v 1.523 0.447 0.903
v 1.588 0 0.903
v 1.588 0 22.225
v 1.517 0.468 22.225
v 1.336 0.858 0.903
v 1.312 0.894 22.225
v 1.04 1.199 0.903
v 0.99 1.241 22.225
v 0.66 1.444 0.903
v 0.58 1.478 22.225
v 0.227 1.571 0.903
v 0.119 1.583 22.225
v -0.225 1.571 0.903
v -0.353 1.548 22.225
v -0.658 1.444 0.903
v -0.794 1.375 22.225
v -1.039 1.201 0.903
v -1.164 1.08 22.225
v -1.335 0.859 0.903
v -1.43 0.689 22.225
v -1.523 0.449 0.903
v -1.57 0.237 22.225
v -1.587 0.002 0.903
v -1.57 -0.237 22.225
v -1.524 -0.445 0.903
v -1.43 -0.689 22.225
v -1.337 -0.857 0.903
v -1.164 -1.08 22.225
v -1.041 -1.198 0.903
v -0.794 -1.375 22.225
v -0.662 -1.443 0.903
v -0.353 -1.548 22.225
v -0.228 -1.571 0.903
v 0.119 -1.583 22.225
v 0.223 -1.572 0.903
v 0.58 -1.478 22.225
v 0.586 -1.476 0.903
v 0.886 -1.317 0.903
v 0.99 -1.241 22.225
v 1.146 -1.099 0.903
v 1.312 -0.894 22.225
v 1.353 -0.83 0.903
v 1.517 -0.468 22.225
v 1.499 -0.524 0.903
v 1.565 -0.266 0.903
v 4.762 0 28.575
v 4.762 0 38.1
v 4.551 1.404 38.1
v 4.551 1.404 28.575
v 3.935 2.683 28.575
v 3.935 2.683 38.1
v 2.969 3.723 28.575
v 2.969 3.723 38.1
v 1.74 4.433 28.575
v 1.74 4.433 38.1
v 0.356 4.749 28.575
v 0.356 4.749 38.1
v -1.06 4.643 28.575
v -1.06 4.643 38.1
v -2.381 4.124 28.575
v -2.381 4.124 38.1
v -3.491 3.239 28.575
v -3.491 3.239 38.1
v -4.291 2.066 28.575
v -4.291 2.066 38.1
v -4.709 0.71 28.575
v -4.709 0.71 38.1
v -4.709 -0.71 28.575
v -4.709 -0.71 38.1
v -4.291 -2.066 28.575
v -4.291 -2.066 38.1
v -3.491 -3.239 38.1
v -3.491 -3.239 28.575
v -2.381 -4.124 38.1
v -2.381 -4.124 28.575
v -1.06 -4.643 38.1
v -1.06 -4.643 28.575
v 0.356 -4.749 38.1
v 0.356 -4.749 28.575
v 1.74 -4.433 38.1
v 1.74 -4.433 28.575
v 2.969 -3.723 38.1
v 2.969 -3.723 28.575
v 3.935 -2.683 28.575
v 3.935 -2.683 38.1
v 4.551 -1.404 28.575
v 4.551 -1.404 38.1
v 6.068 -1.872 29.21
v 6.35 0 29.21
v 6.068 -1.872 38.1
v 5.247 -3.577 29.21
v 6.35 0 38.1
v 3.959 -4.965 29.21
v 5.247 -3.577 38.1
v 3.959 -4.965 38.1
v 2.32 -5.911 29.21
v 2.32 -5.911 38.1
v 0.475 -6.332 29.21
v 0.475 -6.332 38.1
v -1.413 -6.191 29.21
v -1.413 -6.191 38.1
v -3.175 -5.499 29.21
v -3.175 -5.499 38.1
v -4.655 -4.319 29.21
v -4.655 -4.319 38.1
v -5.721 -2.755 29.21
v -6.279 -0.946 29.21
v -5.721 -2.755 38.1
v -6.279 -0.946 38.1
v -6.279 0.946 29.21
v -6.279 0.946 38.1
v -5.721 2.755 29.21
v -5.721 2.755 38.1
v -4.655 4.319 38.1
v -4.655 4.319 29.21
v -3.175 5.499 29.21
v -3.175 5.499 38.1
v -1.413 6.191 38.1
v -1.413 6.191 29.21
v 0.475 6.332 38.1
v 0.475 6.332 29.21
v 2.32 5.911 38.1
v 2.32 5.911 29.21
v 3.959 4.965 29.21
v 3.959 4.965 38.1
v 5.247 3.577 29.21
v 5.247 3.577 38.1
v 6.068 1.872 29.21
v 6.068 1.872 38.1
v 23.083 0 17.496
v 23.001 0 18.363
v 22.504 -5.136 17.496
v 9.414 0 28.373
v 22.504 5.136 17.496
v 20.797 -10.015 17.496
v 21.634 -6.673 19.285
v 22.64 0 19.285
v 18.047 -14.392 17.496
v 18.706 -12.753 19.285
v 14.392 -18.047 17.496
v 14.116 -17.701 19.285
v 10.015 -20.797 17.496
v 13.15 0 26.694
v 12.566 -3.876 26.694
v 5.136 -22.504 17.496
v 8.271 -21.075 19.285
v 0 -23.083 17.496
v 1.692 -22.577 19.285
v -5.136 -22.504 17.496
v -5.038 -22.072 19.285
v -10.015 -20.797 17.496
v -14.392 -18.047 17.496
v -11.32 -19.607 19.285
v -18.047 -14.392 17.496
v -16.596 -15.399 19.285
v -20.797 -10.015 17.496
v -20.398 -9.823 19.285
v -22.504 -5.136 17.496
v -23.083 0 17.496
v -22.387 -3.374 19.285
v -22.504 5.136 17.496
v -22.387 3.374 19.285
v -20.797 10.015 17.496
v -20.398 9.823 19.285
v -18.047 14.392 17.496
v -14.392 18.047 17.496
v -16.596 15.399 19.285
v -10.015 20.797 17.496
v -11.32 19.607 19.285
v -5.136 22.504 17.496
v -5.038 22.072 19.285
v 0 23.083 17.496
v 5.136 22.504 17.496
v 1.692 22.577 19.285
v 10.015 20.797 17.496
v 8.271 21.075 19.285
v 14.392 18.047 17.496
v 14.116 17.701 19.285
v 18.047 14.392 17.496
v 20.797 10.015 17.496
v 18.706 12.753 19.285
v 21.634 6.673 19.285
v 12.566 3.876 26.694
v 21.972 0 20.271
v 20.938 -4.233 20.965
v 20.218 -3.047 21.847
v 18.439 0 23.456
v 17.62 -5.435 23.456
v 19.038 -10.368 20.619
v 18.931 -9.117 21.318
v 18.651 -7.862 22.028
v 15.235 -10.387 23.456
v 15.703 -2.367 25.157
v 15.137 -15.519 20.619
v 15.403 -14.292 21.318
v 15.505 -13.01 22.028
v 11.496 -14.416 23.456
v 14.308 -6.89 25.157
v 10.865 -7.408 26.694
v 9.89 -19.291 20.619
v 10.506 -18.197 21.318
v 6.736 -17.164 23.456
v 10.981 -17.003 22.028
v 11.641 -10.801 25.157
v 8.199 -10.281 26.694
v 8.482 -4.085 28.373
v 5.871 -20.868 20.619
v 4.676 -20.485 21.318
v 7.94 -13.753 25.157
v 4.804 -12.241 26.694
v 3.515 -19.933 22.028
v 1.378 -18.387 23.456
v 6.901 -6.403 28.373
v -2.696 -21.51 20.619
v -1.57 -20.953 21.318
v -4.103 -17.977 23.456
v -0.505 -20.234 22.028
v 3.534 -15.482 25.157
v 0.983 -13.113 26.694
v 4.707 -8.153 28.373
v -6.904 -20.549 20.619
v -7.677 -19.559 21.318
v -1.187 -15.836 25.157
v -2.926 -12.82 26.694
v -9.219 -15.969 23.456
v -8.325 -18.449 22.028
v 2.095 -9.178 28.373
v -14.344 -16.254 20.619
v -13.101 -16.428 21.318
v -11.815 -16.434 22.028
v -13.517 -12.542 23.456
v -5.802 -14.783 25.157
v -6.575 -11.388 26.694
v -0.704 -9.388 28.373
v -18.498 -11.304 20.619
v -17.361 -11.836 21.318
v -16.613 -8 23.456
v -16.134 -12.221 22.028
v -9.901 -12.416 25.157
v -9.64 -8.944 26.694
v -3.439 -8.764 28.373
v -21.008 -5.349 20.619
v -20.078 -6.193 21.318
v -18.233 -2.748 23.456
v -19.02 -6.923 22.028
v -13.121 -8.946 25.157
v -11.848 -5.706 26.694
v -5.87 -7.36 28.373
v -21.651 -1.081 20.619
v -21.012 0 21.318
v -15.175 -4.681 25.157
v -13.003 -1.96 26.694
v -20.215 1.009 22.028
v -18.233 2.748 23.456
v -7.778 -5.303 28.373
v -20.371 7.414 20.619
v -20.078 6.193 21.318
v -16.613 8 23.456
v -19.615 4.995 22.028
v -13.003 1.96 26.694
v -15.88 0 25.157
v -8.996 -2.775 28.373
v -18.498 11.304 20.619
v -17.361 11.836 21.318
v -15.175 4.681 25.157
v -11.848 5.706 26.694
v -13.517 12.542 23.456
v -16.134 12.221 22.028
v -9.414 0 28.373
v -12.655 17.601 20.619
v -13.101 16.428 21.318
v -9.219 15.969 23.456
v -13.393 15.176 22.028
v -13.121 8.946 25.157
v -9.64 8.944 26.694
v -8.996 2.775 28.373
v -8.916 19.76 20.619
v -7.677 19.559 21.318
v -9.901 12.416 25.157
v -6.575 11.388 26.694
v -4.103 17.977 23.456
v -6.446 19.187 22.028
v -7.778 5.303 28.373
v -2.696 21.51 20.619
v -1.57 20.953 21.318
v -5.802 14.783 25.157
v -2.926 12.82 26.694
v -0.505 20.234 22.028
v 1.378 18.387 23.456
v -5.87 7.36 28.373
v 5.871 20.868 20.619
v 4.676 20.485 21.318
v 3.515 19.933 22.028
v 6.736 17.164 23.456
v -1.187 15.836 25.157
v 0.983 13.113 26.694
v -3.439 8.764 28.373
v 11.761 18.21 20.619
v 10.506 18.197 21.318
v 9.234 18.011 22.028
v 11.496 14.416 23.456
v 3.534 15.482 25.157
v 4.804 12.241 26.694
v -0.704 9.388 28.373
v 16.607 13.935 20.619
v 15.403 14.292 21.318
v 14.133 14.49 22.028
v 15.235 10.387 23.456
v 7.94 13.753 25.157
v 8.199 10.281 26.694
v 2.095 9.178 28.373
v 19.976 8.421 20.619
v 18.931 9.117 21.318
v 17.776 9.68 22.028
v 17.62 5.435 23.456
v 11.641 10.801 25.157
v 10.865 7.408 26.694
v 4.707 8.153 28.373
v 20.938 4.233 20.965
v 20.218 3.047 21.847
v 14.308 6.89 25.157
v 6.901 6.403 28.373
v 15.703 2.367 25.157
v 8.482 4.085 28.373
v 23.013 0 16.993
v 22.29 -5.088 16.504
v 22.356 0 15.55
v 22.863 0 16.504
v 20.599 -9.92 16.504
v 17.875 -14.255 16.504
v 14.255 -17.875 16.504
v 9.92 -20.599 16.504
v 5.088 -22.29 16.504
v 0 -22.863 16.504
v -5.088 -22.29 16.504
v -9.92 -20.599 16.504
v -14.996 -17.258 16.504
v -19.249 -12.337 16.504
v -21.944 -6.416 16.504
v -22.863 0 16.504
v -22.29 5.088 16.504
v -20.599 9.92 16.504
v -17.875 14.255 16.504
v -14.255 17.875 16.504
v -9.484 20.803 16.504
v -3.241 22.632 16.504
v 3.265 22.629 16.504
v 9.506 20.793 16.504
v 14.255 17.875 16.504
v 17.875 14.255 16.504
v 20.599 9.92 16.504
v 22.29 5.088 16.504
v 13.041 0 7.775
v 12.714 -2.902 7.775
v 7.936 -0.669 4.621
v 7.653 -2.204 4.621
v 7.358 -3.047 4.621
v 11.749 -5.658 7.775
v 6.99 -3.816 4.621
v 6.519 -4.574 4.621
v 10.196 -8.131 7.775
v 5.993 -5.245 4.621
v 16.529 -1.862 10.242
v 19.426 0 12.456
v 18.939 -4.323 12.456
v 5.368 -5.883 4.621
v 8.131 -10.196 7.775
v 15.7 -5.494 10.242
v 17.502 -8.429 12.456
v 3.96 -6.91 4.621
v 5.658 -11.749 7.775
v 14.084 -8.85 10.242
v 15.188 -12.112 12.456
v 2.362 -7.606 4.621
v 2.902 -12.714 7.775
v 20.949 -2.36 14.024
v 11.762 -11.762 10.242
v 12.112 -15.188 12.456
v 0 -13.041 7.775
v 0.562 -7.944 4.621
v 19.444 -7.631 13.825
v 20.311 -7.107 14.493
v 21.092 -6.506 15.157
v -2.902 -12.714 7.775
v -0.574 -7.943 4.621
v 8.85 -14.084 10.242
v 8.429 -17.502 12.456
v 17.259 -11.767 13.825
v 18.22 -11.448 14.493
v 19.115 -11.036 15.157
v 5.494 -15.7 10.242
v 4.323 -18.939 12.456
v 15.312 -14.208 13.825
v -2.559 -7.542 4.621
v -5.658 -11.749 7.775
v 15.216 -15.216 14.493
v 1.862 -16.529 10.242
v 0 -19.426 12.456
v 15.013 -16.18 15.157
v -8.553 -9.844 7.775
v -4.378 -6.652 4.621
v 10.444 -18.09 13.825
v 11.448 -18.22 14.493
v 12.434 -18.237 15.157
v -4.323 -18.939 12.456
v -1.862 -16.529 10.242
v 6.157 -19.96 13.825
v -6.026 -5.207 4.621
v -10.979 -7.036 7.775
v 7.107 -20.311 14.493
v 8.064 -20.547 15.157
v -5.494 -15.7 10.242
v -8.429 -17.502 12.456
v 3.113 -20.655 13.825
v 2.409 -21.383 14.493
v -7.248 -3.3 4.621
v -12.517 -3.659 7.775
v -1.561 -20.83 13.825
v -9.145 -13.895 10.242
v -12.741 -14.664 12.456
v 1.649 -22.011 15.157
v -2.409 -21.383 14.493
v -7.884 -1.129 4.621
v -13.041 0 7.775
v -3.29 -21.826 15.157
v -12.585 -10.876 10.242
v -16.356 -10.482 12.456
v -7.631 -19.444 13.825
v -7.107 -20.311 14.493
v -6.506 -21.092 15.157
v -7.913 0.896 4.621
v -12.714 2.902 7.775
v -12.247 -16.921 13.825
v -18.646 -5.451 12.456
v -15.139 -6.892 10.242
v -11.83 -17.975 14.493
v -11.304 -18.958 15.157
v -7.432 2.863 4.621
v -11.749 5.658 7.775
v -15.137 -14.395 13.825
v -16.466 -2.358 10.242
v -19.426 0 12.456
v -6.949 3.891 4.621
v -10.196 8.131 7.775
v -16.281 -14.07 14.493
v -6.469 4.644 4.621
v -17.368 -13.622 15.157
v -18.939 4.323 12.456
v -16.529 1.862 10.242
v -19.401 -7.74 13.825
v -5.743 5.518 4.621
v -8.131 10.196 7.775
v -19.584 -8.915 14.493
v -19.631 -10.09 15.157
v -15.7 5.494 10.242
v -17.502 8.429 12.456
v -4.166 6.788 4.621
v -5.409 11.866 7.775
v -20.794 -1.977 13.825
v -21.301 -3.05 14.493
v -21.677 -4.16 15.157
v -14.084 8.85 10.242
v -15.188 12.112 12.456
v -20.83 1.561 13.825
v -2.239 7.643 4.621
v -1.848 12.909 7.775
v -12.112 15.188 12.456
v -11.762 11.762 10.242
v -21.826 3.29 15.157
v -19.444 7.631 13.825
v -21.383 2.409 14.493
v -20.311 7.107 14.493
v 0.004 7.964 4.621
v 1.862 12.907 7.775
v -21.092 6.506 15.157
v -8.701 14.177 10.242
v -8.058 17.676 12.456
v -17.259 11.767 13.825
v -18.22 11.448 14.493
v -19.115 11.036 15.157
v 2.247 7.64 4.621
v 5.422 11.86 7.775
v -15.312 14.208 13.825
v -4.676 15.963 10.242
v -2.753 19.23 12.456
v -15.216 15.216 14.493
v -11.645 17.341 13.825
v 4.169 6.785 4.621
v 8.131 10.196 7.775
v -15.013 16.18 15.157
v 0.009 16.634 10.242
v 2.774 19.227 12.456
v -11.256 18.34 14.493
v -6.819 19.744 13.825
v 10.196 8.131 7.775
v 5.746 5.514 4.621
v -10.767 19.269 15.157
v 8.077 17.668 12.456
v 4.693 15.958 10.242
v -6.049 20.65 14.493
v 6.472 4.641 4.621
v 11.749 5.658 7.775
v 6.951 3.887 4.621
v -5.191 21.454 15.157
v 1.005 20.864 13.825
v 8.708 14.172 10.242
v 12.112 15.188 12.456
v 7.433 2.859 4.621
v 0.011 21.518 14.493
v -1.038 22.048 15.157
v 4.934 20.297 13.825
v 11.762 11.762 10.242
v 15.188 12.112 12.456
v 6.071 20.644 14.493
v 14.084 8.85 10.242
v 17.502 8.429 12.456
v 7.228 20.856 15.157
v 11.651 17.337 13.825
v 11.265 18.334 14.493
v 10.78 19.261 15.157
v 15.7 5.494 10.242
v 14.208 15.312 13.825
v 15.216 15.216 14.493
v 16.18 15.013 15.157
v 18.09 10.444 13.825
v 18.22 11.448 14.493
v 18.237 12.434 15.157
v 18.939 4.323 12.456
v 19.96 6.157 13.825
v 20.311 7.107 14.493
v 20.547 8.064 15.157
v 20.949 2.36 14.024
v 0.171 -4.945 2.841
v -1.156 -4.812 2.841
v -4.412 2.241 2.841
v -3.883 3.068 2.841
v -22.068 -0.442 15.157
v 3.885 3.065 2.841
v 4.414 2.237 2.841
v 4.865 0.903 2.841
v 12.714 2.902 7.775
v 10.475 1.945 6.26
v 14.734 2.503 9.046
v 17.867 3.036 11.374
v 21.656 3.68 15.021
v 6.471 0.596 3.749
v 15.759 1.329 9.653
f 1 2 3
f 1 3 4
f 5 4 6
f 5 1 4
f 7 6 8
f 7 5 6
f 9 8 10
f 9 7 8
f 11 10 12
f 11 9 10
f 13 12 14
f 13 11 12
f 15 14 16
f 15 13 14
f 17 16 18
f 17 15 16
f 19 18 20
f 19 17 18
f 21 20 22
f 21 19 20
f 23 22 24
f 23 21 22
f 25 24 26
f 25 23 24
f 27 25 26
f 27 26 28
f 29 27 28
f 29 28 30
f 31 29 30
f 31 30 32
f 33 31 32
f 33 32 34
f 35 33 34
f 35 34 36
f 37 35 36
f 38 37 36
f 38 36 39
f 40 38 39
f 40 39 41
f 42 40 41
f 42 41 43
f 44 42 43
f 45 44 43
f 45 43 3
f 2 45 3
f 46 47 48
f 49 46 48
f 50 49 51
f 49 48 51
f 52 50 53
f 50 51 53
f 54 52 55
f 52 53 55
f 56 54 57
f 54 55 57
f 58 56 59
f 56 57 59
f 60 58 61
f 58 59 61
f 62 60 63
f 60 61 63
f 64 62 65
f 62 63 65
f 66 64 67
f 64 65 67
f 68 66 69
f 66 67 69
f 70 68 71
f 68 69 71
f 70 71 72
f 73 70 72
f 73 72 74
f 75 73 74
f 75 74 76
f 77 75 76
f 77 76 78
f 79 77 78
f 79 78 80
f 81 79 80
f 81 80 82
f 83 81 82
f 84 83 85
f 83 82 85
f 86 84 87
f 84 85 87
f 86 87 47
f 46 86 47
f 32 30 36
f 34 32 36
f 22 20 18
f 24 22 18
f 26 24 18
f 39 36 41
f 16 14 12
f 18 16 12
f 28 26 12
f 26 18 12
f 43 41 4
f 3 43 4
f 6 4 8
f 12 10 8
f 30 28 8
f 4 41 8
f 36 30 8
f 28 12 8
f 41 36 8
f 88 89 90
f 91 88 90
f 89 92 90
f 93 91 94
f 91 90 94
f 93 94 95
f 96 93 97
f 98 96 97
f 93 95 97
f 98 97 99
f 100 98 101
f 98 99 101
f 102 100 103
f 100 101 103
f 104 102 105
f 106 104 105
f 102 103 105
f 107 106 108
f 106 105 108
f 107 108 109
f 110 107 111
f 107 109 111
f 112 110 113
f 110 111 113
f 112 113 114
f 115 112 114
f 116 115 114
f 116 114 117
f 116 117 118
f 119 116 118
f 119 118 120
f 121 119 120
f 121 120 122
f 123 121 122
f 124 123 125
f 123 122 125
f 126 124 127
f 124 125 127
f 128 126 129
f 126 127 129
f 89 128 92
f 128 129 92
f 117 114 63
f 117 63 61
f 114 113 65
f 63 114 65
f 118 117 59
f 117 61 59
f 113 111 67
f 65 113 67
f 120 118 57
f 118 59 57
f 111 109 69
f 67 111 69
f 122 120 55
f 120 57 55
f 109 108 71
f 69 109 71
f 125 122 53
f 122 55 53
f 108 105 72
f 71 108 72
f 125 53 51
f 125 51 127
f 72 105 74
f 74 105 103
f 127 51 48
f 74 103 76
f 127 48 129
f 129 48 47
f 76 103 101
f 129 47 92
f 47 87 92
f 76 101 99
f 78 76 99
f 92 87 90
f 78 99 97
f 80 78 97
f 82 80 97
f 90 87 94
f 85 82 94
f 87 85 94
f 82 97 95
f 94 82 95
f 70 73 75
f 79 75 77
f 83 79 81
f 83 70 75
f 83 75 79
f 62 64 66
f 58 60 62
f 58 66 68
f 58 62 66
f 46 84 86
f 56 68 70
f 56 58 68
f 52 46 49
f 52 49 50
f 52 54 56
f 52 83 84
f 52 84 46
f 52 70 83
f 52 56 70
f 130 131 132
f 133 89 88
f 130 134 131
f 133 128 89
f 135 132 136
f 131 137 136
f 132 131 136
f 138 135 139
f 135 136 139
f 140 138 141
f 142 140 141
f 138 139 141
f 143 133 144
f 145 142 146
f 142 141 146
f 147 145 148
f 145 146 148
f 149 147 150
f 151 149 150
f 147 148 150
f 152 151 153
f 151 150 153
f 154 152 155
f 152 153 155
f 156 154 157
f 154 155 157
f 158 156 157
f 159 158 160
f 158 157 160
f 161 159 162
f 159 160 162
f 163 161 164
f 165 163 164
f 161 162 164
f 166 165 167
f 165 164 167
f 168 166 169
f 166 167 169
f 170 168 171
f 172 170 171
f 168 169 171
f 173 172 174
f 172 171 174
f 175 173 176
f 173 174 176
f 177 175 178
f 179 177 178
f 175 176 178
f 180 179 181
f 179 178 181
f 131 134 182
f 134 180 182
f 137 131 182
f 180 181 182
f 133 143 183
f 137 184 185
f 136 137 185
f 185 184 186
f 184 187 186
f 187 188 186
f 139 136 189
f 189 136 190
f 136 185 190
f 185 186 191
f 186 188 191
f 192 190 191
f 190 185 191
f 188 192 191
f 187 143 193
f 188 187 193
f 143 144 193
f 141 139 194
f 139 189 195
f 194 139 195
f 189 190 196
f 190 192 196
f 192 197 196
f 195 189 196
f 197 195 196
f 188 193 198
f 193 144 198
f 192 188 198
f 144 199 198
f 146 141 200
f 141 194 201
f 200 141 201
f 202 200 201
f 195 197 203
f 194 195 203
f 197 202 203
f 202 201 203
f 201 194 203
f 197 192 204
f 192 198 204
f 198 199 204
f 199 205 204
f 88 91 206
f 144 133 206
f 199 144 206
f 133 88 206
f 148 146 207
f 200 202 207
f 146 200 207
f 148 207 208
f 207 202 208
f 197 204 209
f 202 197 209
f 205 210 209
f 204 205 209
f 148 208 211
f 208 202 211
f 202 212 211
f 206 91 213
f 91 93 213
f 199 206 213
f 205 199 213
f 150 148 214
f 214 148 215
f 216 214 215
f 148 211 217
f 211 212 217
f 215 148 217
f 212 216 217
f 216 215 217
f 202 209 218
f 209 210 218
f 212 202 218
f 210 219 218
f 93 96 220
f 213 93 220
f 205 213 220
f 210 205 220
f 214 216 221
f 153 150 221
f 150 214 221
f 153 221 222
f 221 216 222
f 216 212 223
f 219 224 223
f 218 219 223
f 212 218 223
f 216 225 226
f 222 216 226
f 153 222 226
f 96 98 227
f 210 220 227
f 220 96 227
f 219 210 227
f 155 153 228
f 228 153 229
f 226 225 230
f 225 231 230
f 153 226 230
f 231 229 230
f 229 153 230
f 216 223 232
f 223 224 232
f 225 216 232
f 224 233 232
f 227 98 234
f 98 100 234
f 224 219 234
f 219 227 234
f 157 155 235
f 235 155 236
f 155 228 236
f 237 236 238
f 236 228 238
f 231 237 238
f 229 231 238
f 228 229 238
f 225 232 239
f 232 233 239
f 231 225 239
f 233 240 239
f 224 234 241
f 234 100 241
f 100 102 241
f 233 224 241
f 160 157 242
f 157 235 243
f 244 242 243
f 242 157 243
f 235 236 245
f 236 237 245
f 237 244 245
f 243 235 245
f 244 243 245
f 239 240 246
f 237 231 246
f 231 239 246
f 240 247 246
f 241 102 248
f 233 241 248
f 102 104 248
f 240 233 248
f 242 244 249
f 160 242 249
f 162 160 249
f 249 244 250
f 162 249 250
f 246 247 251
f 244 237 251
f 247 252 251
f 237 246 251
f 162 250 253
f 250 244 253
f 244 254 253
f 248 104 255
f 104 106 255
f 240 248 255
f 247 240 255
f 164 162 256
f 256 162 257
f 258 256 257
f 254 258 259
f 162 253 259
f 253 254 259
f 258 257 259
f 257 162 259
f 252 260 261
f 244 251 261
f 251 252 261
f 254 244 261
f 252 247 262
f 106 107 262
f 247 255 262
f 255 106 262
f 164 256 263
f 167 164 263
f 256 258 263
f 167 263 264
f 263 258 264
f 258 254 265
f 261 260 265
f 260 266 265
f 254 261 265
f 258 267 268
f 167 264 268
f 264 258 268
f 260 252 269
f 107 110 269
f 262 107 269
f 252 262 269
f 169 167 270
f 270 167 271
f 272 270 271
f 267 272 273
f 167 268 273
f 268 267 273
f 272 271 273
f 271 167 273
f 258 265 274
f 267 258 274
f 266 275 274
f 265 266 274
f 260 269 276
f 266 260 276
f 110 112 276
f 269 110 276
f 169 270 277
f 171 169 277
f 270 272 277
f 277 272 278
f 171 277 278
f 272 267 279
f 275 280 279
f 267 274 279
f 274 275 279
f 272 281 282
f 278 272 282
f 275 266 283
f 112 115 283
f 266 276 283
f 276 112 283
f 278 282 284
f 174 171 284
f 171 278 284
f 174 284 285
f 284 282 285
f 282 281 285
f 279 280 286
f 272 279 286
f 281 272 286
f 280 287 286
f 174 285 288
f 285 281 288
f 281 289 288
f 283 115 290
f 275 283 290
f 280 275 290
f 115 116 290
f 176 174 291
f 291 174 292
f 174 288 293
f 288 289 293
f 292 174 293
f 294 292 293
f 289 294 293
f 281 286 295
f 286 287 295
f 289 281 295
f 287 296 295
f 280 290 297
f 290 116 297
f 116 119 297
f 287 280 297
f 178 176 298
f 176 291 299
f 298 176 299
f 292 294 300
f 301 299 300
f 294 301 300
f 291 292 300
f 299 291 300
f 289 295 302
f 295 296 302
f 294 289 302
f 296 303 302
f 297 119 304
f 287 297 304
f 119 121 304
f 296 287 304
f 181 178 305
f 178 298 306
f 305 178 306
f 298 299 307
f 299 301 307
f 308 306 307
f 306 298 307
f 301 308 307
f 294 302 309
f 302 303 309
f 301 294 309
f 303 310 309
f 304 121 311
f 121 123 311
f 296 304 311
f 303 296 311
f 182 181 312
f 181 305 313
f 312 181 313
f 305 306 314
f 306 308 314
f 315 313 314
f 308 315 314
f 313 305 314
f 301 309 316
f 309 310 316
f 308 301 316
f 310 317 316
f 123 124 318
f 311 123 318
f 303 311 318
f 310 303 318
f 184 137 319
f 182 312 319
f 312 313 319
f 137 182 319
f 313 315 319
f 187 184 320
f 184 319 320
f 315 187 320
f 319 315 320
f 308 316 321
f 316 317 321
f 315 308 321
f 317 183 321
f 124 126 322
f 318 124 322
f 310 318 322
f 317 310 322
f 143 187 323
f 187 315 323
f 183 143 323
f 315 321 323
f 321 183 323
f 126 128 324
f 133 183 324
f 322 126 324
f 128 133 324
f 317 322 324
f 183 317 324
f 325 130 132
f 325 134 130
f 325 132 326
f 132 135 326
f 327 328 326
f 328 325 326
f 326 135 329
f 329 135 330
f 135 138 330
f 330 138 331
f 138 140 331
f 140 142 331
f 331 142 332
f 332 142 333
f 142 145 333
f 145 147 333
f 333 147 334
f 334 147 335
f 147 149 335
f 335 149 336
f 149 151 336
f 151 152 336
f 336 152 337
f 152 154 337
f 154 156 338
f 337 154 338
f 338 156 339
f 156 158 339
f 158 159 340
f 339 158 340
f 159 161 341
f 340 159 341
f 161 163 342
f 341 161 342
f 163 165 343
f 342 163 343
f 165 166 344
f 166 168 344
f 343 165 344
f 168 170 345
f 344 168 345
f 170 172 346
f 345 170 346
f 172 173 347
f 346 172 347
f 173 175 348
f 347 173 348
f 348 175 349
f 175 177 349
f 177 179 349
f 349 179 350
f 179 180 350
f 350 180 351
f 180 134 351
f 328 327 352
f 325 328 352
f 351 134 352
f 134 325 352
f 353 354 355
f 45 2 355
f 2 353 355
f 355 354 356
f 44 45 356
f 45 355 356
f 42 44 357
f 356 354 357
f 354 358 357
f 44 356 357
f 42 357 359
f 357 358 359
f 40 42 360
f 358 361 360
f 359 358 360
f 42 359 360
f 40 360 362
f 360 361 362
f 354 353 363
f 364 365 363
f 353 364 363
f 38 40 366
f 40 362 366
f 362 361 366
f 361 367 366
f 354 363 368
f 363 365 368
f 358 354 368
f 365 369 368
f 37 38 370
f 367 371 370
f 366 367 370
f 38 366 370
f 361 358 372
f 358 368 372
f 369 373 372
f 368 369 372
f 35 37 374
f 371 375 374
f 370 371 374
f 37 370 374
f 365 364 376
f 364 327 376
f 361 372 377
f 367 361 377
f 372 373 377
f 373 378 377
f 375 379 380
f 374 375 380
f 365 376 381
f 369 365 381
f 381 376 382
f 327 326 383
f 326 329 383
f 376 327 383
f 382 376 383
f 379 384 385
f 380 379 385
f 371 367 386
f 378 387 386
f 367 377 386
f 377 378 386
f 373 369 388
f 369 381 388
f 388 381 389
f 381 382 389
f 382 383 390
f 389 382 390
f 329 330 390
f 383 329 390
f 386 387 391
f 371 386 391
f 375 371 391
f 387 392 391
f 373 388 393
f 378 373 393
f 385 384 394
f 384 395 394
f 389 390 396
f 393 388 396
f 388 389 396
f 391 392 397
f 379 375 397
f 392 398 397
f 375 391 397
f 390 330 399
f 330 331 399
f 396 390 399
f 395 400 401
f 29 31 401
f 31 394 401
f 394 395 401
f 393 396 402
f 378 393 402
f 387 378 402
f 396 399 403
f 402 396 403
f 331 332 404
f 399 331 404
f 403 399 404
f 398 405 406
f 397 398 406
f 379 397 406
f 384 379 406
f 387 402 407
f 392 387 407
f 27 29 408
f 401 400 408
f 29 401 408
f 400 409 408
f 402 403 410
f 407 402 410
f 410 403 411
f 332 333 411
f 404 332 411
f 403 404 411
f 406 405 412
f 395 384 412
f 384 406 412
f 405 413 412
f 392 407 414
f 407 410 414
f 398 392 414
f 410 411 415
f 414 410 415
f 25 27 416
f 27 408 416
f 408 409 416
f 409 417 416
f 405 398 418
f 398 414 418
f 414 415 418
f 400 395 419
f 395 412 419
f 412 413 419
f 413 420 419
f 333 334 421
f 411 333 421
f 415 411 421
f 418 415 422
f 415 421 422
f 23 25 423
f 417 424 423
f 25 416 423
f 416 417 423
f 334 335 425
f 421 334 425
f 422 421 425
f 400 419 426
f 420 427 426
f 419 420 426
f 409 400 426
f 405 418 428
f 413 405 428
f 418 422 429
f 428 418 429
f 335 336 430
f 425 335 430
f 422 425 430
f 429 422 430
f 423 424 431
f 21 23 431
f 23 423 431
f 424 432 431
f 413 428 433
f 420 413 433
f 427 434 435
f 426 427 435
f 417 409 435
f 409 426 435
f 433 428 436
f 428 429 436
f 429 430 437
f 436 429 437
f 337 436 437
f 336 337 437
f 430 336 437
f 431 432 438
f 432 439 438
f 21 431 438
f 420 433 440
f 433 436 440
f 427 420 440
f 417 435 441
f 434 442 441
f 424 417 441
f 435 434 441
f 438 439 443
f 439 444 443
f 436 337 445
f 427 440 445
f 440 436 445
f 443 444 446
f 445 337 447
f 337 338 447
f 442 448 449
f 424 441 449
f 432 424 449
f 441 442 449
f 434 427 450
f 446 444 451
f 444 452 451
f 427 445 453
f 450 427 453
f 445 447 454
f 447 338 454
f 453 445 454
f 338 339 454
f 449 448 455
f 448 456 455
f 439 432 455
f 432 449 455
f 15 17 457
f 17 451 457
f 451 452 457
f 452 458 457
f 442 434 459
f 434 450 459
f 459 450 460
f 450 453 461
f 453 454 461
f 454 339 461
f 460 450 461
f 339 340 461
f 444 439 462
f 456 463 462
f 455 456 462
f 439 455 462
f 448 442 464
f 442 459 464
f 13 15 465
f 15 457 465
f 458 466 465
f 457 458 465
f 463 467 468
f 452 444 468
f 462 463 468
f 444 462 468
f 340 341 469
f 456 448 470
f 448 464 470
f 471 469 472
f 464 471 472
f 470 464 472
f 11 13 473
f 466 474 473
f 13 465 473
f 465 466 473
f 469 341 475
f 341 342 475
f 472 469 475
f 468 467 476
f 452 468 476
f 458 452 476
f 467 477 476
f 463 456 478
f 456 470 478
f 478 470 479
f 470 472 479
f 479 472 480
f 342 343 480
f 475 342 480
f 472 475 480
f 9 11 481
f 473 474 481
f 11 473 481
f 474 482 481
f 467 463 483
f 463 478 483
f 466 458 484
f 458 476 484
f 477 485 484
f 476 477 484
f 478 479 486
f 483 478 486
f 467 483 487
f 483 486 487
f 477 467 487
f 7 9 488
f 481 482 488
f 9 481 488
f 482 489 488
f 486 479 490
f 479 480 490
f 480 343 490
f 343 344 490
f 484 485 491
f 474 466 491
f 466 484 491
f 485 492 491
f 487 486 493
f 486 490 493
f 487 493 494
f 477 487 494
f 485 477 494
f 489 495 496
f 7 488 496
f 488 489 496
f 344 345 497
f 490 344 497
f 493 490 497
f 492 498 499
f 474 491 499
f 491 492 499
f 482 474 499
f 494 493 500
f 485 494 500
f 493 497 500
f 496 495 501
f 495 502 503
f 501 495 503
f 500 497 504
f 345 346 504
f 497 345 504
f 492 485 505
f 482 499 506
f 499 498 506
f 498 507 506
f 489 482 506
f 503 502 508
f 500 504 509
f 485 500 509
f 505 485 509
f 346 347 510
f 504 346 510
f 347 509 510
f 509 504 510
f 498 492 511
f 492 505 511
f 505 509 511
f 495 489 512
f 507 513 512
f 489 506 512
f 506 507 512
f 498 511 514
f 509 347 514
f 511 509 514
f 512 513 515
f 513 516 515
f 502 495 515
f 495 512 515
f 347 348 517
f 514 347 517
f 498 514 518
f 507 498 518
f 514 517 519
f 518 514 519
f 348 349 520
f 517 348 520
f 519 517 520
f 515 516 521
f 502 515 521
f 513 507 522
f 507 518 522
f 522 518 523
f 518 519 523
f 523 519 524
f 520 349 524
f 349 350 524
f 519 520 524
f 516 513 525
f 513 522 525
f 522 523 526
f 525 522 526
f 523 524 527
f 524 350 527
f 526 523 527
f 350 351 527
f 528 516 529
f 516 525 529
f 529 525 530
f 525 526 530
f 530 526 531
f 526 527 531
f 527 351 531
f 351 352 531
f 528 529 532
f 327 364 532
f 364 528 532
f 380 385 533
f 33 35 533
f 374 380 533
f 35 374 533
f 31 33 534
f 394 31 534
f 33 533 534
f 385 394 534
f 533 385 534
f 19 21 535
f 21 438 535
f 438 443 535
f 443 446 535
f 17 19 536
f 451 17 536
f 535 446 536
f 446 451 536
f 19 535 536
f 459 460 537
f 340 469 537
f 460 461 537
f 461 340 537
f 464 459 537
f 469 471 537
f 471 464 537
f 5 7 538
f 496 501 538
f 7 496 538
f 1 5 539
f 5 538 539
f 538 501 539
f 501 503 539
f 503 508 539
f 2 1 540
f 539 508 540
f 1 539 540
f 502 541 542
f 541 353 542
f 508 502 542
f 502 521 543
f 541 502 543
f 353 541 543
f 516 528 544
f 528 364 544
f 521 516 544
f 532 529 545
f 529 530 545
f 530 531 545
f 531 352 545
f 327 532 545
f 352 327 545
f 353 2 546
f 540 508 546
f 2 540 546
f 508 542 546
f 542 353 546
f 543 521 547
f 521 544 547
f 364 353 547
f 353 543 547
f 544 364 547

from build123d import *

# Parameters (mm, degrees)
F2_R     = 4.7625
F3_DEPTH = 9.525
F4_R     = 1.5875
F5_DEPTH = 22.225


with BuildPart() as f1:
    # F0 (on Front) → F1 (revolve)
    with BuildSketch(Plane.XZ):
        with BuildLine():
            Line((0, 38.1), (0, 0))
            add(Edge.make_bspline(
                [(0, 0), (11.7584649328, 6.6668250328), (19.7077058908, 11.7946774257), (23.020163798, 16.3133065778), (23.0828764178, 17.4960782864)],
                knots=[0, 0, 0, 0, 0.4304974224, 0.5620722598, 0.5620722598, 0.5620722598, 0.5620722598], degree=3))
            add(Edge.make_bspline(
                [(23.0828764178, 17.4960782864), (23.114800057, 18.0981640784), (22.1160167846, 22.2466526855), (10.6358158862, 28.6732271947), (6.35, 29.21)],
                knots=[0.5620722598, 0.5620722598, 0.5620722598, 0.5620722598, 0.6290499695, 1, 1, 1, 1], degree=3))
            Line((6.35, 29.21), (6.35, 38.1))
            Line((6.35, 38.1), (0, 38.1))
        make_face()
    revolve(axis=Axis((0, 0, 19.05), (0, 0, -1)))

    # F2 (on face) → F3 (cut)
    with BuildSketch(Plane.XY.offset(38.1)):
        Circle(F2_R)
    extrude(amount=-F3_DEPTH, mode=Mode.SUBTRACT)

    # F4 (on Top) → F5 (cut)
    with BuildSketch(Plane.XY):
        Circle(F4_R)
    extrude(amount=F5_DEPTH, mode=Mode.SUBTRACT)


solid = f1.part
